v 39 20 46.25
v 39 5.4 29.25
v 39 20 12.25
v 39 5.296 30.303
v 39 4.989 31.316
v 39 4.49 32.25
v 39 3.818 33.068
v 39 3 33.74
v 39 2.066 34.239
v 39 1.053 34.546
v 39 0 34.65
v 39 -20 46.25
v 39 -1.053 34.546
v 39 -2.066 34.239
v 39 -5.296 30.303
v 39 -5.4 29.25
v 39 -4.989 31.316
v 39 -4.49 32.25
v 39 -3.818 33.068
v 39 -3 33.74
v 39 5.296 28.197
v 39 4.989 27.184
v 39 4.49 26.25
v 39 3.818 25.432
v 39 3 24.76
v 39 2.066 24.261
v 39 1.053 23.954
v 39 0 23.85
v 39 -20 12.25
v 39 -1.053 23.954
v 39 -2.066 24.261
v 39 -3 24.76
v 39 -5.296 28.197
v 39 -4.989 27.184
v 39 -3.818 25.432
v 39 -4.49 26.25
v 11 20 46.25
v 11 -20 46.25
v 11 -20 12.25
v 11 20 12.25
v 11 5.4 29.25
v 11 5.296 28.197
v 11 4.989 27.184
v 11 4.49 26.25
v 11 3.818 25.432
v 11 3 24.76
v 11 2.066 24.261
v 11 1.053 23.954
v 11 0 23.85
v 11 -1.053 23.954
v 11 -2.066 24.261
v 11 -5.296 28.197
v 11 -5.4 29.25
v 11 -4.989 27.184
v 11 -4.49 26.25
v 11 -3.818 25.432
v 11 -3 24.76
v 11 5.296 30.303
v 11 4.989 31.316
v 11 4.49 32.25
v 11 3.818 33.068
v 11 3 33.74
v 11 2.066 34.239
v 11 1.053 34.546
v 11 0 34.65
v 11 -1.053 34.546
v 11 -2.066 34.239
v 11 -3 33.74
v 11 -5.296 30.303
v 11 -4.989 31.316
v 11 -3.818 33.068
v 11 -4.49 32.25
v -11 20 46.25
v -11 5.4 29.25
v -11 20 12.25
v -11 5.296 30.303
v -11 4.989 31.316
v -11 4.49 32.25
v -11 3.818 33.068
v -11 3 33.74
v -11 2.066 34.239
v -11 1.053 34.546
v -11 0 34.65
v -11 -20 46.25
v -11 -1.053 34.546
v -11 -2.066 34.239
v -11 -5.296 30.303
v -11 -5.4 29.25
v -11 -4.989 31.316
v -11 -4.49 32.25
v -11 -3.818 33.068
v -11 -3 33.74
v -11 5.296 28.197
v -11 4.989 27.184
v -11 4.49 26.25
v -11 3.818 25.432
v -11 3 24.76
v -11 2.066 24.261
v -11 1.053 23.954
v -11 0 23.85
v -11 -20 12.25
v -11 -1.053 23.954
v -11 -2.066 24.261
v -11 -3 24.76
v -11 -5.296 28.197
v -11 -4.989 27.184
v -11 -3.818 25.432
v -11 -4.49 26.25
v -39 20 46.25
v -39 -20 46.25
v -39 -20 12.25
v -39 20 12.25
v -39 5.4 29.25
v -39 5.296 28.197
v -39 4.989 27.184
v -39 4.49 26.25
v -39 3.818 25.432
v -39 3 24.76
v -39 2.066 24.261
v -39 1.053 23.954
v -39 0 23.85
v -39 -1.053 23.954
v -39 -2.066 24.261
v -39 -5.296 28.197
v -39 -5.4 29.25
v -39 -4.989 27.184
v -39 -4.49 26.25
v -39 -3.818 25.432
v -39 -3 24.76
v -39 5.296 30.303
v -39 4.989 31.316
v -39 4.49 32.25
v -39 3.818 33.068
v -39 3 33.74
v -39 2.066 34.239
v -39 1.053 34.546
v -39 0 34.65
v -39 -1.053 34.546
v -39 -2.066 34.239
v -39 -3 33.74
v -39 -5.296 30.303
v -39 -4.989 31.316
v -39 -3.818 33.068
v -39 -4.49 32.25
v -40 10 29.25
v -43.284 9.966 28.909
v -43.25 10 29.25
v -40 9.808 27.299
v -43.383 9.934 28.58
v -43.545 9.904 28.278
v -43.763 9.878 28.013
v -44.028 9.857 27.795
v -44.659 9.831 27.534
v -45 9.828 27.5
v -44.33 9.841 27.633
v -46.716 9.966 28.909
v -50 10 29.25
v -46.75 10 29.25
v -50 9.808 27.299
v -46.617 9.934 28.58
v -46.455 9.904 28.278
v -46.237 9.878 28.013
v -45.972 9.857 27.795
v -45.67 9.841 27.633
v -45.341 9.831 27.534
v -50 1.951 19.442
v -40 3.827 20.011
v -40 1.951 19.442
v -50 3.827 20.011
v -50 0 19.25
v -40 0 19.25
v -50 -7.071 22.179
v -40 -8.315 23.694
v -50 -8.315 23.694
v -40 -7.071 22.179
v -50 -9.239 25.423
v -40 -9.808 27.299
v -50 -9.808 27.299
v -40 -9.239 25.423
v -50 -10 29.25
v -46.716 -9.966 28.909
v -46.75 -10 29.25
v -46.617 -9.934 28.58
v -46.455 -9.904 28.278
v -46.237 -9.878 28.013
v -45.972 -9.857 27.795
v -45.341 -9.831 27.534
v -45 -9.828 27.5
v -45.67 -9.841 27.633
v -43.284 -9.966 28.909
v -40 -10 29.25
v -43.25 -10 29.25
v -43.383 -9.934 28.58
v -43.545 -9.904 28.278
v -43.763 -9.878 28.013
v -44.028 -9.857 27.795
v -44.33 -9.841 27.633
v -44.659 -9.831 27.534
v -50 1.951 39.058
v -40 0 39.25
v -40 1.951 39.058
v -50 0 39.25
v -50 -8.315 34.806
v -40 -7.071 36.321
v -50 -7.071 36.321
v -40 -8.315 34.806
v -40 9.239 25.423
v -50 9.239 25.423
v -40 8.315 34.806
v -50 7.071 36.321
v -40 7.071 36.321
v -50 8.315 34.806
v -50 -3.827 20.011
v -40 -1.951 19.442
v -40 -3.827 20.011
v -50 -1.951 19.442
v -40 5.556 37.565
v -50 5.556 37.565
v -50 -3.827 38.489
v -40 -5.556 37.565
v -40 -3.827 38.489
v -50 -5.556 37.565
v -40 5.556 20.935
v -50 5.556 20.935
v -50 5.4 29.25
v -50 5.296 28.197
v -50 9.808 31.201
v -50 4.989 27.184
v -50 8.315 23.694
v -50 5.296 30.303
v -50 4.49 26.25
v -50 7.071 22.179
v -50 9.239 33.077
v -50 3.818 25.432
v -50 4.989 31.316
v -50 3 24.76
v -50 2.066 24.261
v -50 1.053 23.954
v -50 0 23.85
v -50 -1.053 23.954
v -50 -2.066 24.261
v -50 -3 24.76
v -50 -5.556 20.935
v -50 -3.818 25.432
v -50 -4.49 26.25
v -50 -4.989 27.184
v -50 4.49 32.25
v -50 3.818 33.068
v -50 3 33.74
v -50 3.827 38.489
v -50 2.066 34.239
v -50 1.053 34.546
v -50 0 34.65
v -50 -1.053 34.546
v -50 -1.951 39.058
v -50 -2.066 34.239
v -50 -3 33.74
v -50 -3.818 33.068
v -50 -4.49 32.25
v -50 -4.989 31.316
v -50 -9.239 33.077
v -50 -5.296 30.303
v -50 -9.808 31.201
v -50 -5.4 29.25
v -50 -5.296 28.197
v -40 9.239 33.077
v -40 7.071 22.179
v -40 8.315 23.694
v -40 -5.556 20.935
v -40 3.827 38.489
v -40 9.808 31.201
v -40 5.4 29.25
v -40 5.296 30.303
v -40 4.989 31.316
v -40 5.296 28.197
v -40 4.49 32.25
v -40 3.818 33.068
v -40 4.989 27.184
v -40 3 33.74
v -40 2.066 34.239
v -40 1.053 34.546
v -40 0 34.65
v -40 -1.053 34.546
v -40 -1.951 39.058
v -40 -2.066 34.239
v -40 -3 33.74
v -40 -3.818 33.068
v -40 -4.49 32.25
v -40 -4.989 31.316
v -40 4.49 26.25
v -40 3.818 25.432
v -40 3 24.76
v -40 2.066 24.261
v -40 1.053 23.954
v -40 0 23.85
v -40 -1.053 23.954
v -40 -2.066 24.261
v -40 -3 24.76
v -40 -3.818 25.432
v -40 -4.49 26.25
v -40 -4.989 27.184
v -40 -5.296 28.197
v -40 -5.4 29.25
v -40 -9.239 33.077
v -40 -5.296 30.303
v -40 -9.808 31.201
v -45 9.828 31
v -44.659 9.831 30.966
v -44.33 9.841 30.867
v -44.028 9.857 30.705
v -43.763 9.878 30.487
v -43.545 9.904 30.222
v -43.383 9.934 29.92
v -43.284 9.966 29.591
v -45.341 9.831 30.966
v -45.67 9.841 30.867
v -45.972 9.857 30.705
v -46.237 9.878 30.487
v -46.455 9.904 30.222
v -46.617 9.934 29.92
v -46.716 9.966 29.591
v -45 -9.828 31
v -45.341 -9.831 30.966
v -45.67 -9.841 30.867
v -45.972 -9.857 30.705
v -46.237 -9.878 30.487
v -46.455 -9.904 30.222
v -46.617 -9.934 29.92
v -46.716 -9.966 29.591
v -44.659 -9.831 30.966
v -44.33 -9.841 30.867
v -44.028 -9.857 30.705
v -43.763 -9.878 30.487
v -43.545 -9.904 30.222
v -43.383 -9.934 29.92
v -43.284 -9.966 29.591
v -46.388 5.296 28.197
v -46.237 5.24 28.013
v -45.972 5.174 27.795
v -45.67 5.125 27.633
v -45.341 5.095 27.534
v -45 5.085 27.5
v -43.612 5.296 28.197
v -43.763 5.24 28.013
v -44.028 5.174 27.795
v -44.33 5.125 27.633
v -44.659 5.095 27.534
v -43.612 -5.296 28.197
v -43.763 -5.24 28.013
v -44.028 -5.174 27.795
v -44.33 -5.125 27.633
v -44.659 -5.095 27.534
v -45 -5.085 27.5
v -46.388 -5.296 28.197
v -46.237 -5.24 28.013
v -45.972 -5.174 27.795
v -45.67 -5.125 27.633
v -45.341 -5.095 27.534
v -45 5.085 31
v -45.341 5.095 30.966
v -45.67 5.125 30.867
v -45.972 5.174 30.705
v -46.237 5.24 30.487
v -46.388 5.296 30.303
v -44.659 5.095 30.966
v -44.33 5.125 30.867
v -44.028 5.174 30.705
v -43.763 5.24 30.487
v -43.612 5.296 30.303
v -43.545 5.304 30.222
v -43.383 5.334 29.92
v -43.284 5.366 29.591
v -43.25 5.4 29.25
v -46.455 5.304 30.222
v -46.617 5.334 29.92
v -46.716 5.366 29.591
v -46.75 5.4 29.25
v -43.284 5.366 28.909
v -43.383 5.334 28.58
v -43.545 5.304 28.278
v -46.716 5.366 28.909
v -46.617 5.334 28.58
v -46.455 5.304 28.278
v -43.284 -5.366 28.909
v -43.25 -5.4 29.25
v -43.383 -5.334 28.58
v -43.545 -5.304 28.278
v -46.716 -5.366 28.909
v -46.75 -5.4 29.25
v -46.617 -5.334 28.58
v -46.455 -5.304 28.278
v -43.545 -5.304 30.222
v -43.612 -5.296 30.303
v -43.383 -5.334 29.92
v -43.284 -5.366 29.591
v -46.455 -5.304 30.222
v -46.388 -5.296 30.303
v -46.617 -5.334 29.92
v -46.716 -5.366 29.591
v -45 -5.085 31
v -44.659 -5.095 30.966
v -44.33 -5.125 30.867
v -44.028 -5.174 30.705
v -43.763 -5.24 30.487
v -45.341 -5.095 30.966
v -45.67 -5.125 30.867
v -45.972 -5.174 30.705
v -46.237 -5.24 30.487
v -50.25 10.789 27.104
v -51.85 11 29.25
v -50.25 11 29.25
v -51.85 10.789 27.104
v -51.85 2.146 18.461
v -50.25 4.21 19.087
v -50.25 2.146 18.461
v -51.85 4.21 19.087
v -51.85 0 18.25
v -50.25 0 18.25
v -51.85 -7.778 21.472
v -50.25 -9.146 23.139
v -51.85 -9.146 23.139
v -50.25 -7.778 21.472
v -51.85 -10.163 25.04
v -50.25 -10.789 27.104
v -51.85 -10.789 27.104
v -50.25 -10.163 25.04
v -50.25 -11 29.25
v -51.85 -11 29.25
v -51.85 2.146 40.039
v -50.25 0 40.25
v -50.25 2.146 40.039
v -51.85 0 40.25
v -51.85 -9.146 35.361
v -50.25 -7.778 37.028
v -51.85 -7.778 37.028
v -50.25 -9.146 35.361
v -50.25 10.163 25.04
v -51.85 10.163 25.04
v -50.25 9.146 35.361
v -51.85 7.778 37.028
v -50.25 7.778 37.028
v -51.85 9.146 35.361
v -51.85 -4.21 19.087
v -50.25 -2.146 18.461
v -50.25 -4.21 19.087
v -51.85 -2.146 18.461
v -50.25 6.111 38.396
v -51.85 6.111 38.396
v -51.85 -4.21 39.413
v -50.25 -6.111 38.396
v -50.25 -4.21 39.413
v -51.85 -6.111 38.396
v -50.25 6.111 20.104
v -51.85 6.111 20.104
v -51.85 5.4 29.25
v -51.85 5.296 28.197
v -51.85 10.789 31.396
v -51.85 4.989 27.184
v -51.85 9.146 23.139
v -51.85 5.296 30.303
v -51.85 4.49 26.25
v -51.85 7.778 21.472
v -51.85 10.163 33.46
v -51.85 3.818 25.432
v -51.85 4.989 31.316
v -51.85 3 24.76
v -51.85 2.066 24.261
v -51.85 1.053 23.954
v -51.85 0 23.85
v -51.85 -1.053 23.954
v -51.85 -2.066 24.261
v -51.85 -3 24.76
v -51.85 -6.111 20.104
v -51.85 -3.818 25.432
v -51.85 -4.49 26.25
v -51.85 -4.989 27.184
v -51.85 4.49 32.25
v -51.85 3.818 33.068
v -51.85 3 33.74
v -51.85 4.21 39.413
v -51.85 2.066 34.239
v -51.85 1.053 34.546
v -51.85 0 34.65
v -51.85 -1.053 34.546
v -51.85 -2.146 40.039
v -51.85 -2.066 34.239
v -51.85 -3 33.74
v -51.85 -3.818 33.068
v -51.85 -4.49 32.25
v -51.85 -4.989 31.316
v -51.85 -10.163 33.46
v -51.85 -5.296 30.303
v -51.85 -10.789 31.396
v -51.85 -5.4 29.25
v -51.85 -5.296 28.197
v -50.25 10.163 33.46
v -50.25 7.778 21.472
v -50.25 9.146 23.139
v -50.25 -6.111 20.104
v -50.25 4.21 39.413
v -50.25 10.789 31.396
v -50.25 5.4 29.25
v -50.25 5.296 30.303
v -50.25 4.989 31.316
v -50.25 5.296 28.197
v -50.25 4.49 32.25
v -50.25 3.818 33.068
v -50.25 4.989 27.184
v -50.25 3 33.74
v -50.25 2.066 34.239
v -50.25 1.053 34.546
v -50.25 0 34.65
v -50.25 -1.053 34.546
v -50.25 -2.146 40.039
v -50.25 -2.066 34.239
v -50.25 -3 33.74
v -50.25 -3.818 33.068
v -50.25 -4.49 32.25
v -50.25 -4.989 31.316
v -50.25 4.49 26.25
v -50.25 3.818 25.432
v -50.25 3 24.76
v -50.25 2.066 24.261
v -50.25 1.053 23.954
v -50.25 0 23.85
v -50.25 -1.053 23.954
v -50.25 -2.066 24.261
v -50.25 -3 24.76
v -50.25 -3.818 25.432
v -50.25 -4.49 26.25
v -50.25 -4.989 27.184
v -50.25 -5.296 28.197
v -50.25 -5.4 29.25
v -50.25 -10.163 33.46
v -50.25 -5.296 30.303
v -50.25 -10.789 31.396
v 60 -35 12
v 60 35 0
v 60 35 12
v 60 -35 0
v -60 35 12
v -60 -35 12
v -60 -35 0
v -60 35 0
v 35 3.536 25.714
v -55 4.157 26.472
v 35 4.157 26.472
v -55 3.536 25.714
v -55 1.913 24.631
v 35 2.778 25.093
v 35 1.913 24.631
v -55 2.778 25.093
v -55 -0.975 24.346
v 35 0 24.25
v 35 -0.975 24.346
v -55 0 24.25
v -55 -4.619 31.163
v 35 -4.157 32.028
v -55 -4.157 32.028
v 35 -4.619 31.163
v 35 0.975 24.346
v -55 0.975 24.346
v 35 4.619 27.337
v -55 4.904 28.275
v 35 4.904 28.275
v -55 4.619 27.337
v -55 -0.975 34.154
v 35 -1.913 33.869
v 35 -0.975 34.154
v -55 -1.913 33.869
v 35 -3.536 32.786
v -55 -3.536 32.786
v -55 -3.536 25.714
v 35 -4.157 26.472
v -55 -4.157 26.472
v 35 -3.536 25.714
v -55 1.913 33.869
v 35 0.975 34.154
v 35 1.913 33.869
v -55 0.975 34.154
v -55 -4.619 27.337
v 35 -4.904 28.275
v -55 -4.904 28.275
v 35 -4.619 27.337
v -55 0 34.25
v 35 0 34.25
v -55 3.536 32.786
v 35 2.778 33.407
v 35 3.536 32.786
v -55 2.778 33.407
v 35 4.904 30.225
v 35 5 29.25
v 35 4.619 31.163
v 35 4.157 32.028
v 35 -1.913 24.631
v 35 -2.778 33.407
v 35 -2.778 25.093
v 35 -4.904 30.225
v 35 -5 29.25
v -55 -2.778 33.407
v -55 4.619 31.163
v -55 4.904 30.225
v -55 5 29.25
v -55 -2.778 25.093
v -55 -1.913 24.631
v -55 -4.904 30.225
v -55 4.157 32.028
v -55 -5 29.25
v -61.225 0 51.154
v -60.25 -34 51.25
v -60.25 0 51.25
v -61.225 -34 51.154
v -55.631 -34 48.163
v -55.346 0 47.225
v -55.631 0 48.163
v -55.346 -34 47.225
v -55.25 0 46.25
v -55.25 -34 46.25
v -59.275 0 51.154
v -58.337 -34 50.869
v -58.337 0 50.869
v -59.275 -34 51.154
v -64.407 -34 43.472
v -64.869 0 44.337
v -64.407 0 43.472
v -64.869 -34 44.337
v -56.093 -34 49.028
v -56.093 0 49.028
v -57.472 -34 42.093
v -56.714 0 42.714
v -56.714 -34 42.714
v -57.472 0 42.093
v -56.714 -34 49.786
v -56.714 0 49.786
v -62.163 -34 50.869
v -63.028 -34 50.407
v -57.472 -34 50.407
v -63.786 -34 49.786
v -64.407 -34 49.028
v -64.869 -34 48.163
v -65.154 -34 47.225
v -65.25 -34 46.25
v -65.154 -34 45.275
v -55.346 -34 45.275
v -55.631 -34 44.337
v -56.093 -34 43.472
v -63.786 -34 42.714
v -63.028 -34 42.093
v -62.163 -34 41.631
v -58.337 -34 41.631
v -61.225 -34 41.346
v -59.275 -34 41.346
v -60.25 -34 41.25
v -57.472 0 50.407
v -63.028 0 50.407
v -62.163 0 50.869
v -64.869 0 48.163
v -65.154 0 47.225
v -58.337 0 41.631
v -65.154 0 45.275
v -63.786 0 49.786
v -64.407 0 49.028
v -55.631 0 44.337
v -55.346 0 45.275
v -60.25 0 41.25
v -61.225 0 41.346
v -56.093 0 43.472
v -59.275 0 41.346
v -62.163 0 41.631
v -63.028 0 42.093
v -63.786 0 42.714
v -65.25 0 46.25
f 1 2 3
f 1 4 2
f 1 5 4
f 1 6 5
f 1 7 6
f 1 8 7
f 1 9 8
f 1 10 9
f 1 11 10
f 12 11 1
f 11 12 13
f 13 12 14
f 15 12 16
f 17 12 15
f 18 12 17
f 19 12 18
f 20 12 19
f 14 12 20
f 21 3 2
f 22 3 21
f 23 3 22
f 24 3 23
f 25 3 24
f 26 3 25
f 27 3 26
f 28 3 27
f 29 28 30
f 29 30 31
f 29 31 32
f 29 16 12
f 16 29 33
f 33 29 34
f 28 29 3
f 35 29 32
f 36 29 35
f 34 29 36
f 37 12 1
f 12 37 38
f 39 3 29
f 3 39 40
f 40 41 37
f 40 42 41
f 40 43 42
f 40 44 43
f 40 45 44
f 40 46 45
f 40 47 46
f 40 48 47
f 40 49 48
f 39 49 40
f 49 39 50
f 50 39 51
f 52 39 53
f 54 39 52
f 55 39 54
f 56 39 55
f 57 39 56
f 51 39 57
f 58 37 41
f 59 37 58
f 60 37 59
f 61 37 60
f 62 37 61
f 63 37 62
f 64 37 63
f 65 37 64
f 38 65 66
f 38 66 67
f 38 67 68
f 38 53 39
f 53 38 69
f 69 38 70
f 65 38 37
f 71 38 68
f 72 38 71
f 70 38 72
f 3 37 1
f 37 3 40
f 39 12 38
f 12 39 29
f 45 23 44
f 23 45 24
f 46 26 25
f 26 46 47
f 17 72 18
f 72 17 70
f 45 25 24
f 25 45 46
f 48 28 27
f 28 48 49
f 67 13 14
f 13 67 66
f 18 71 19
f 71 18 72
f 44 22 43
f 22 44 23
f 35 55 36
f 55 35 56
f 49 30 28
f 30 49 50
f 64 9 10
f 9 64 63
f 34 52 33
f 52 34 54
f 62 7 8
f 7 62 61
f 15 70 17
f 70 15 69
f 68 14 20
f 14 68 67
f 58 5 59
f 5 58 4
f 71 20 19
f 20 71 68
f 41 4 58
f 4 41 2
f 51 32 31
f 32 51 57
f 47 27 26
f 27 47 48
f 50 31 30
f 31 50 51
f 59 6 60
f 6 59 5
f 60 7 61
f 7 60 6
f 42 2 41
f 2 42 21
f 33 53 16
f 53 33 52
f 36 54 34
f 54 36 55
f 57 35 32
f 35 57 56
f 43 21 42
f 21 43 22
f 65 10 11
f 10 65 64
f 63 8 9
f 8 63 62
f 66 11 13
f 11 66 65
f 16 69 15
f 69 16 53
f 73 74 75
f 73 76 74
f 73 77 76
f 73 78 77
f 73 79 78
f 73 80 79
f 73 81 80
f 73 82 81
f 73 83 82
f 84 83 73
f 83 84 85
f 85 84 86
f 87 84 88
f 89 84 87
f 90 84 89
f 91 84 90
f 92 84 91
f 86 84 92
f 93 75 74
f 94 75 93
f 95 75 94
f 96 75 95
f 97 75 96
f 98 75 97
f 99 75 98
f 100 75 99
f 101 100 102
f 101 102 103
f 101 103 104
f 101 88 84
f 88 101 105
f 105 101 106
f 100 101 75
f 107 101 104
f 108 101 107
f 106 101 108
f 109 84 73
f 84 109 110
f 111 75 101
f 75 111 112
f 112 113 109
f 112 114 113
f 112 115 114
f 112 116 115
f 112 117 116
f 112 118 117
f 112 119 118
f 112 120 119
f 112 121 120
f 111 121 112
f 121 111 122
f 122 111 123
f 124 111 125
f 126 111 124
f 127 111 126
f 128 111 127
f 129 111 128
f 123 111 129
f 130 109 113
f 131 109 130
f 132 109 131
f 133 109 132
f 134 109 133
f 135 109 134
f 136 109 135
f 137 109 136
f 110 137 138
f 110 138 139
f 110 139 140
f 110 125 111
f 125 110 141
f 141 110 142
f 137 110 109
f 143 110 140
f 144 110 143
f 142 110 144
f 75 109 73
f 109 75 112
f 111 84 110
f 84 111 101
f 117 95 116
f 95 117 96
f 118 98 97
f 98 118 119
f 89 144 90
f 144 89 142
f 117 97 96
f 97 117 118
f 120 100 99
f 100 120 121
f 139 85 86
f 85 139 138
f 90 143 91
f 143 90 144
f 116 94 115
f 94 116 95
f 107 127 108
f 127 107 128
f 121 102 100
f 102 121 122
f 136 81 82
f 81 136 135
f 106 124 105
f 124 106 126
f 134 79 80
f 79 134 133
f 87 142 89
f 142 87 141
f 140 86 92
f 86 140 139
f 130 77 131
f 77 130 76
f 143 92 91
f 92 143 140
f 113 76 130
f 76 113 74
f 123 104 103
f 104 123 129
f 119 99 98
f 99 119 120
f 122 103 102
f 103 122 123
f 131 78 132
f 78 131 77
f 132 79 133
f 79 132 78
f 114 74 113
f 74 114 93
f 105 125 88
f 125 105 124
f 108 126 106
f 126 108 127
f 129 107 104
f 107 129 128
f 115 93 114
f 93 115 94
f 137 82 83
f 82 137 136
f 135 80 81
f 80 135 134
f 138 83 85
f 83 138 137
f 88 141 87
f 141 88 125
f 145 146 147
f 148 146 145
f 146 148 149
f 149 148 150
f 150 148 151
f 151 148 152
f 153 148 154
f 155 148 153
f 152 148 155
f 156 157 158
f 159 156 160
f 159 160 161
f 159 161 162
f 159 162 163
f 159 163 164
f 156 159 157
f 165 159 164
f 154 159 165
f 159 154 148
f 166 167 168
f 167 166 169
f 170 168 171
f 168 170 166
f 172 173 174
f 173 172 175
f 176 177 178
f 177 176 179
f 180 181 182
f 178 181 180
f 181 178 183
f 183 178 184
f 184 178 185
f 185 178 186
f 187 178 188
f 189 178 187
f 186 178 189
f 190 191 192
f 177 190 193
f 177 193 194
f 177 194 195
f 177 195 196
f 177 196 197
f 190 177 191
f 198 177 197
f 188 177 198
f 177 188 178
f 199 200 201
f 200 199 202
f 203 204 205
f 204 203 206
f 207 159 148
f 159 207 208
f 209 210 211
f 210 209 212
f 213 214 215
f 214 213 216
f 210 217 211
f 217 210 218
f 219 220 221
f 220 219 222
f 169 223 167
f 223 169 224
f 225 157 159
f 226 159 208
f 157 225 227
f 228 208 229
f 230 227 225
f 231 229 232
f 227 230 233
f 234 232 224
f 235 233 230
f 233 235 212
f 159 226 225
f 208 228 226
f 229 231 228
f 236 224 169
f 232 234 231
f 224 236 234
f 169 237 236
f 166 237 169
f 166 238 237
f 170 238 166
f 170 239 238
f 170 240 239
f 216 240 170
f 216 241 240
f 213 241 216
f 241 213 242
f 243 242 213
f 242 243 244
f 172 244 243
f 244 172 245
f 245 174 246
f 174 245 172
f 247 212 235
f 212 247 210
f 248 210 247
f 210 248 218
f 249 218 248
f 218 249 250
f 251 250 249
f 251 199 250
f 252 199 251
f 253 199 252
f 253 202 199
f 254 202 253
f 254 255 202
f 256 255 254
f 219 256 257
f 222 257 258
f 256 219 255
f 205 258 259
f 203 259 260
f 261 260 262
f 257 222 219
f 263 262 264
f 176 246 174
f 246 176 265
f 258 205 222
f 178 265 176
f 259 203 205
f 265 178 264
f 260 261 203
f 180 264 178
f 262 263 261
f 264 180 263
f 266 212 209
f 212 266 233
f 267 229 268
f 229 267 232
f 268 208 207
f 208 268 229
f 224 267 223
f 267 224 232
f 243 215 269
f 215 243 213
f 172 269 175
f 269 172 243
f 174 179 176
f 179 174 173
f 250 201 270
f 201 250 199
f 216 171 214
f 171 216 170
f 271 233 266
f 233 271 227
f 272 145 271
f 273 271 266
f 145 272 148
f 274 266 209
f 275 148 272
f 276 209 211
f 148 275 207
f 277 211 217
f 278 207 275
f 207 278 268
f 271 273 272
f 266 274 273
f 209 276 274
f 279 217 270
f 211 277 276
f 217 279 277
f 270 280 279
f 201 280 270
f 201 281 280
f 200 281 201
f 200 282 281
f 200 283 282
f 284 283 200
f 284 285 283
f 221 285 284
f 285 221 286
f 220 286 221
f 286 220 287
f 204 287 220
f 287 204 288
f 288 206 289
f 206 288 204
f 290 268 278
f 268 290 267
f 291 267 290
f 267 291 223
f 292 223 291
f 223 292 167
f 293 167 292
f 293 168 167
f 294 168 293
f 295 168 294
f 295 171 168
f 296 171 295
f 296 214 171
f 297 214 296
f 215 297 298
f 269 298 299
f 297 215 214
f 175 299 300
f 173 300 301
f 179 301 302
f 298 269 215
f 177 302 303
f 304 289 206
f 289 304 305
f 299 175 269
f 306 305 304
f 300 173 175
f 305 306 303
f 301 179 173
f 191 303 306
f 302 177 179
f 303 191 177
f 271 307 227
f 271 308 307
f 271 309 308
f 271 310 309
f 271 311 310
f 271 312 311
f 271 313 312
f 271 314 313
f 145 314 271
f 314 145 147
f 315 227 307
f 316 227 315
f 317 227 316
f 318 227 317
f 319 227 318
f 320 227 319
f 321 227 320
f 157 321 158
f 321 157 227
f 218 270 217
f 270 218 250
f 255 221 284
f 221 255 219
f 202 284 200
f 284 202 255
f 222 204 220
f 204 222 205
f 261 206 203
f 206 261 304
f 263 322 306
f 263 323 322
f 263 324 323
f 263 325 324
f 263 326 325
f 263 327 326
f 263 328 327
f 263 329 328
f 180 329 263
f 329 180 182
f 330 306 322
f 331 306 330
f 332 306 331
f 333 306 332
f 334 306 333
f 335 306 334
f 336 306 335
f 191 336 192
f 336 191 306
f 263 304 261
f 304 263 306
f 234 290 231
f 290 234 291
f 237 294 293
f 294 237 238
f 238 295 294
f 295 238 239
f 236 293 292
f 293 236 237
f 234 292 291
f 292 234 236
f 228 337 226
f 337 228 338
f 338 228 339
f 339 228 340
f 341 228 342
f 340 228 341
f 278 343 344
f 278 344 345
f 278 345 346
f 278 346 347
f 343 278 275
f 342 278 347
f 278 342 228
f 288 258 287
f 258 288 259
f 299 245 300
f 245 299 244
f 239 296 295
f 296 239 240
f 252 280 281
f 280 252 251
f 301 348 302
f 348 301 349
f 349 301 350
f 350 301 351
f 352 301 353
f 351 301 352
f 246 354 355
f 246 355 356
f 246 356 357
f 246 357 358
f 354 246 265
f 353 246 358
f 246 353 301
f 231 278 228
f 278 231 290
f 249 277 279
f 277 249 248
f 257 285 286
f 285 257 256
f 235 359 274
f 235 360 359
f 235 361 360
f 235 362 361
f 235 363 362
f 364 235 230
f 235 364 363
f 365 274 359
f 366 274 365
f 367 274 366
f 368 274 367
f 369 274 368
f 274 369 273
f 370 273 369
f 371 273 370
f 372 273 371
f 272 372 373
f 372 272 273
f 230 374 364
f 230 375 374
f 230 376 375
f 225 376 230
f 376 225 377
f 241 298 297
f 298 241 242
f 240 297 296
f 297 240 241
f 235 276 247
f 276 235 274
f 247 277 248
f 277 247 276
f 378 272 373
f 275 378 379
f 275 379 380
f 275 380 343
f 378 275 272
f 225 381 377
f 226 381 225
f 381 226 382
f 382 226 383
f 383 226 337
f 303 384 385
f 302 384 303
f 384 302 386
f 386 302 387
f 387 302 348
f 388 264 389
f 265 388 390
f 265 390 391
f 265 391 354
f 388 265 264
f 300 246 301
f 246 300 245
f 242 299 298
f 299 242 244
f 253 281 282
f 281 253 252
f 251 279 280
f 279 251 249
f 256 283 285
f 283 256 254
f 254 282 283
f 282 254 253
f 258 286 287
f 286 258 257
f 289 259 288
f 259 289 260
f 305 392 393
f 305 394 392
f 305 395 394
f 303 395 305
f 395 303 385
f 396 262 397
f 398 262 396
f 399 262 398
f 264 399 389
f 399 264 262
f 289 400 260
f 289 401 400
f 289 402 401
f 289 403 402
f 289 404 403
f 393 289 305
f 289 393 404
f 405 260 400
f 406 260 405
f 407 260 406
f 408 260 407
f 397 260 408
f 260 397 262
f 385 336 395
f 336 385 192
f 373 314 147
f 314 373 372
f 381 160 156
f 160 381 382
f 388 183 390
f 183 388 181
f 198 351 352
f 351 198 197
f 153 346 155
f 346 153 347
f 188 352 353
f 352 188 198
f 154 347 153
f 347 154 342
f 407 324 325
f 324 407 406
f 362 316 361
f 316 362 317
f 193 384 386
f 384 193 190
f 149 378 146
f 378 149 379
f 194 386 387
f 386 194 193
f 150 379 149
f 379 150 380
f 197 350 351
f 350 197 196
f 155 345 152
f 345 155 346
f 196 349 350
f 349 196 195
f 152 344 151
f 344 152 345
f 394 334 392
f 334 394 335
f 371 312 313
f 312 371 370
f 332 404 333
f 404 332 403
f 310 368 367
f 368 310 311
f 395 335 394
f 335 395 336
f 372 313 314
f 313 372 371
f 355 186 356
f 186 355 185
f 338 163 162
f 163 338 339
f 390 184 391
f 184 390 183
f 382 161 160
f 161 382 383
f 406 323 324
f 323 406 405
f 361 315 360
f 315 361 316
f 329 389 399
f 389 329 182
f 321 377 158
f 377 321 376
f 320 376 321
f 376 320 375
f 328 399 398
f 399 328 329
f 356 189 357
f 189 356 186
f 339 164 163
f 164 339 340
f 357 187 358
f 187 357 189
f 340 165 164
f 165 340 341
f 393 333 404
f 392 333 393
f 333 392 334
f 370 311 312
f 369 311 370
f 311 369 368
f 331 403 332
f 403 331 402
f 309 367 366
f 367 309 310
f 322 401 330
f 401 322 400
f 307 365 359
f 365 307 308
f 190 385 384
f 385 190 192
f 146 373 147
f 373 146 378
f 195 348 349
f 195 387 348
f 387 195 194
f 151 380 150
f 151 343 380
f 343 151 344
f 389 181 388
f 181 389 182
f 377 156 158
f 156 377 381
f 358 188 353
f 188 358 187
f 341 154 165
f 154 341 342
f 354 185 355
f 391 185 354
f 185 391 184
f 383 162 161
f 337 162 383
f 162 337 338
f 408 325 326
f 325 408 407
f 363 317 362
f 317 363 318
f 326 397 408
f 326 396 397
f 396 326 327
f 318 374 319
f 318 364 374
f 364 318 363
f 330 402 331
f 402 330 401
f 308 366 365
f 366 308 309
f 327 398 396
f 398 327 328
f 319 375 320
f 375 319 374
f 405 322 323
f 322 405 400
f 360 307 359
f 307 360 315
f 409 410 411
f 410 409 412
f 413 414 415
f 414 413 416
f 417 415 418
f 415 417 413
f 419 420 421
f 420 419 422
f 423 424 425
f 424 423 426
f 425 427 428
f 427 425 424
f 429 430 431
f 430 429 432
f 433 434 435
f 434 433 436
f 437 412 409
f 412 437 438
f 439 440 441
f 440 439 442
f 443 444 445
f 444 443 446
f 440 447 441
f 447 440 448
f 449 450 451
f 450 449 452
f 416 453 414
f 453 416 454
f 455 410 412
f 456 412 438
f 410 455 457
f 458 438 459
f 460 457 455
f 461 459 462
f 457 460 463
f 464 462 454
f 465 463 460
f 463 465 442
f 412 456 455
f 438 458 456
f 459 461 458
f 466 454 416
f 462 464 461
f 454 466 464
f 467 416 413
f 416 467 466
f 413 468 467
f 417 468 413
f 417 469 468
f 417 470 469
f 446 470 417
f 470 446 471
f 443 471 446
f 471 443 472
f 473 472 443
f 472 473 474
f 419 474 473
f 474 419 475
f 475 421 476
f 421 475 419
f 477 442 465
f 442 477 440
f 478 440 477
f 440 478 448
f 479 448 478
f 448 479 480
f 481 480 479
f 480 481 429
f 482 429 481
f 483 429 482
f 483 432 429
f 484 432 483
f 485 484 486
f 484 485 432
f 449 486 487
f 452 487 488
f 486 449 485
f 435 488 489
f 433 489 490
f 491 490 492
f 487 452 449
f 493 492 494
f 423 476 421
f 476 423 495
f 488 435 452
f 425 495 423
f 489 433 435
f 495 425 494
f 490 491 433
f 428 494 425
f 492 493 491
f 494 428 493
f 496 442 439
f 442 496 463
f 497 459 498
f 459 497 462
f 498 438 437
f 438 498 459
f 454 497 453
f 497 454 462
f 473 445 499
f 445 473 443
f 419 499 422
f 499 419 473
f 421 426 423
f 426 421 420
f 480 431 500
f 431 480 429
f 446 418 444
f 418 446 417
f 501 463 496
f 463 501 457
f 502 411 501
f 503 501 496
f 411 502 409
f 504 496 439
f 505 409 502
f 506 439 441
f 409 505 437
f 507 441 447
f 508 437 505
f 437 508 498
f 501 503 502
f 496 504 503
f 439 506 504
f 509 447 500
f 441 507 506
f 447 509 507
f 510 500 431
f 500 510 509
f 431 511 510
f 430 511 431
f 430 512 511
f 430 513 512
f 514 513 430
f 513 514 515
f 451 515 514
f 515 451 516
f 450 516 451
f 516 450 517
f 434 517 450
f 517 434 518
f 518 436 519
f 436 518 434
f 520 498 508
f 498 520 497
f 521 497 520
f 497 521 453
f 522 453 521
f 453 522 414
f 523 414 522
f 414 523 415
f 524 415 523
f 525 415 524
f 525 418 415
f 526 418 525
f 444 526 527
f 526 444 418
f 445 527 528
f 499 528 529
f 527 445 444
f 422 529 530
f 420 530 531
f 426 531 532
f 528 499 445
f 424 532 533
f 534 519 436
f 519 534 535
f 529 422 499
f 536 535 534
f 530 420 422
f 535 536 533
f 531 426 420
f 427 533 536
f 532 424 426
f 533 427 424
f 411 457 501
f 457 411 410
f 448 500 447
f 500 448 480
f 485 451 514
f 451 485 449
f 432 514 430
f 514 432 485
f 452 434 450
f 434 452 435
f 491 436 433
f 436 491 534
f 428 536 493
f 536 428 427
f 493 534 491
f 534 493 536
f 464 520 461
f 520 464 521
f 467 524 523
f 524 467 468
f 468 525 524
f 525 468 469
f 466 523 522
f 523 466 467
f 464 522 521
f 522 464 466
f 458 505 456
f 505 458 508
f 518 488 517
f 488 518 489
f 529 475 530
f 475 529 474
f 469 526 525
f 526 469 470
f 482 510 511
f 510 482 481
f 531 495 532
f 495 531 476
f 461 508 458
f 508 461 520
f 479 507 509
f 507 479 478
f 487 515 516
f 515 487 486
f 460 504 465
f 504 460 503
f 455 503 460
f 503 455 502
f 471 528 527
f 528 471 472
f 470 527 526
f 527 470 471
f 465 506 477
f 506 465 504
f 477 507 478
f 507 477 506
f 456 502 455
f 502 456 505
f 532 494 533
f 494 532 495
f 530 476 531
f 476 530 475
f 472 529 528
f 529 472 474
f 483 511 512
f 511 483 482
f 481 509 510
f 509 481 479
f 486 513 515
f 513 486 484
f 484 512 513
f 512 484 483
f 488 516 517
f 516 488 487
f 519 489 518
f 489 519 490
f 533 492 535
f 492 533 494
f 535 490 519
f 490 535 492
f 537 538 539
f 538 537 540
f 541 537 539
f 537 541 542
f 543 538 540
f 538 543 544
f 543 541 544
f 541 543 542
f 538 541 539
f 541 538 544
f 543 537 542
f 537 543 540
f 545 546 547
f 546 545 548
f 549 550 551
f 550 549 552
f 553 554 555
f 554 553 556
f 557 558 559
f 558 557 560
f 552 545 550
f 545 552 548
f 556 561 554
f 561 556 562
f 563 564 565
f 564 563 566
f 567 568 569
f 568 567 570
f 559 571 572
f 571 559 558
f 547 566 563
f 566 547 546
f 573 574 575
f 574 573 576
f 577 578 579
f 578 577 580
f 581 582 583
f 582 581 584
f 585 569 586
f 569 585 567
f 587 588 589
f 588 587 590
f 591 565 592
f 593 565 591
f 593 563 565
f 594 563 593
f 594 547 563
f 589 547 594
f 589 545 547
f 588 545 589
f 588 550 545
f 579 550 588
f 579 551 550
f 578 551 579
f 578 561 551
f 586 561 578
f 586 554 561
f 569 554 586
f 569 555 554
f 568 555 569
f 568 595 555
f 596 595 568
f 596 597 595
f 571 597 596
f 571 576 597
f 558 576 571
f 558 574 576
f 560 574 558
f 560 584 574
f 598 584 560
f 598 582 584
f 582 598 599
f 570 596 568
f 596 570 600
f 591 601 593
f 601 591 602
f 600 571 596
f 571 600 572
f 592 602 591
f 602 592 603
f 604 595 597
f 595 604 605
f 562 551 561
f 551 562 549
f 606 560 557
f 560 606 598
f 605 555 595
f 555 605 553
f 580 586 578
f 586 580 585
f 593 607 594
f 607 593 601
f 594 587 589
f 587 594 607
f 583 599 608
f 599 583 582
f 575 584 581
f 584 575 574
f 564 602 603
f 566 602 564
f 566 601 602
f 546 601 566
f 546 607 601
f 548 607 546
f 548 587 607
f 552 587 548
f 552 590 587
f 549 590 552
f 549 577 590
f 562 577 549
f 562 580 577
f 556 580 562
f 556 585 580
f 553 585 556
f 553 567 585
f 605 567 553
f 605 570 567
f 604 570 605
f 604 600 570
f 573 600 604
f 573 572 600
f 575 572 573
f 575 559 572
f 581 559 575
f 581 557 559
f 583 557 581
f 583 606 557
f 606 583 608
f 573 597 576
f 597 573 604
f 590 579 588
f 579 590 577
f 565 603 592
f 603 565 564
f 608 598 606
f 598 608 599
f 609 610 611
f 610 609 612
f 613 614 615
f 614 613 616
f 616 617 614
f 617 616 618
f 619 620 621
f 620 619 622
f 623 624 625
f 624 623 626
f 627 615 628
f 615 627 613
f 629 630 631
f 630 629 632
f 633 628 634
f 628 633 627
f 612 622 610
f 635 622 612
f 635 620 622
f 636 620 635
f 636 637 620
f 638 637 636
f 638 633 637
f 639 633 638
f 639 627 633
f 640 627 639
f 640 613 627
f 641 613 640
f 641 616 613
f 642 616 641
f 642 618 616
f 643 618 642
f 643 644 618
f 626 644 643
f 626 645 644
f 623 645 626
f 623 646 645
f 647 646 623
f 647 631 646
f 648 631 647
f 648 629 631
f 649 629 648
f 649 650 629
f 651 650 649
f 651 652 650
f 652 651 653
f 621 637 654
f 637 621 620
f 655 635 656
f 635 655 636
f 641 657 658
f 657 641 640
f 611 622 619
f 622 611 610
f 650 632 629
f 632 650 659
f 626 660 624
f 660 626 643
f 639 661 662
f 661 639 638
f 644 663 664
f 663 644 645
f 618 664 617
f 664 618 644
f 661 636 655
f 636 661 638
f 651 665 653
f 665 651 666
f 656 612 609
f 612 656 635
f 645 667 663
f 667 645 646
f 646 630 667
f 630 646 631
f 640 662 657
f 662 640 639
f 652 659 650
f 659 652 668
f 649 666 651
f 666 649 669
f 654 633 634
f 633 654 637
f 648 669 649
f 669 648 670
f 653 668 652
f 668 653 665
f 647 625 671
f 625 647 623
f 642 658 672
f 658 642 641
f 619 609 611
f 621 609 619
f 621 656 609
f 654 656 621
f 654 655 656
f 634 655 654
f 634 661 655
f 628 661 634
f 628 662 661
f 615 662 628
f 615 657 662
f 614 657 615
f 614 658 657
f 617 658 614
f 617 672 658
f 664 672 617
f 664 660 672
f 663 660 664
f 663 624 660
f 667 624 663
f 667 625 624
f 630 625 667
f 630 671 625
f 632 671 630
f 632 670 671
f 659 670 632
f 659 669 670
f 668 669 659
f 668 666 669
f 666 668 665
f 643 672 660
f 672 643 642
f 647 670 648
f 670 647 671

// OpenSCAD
$fn = 32;

// ------------------------------------------------------------------------
// Machine vise: screw d10, jaws 28 x 34 mm
// Every part is its own module, assembly() places every instance.
// ------------------------------------------------------------------------

// --- part 1 ---
module vise_bed() {
  difference() {
    translate([-60, -35, 0]) cube([120, 70, 12]);
  }
}

// --- part 2 ---
module vise_jaw() {
  difference() {
    translate([-14, -20, 0]) cube([28, 40, 34]);
    translate([0, 0, 17]) rotate([0, 90, 0]) cylinder(h = 30, d = 10.8, center = true);
  }
}

// --- part 3 ---
module vise_screw() {
  translate([0, 0, -45]) cylinder(h = 90, d = 10);
}

// --- part 4 ---
module screw_collar() {
  difference() {
    cylinder(h = 10, d = 20);
    translate([0, 0, -1]) cylinder(h = 12, d = 10.8);
    translate([0, 0, 5]) rotate([90, 0, 0]) cylinder(h = 22, d = 3.5, center = true);
  }
}

// --- part 5 ---
module screw_washer() {
  difference() {
      translate([0, 0, 0]) cylinder(h = 1.6, d = 22);
      translate([0, 0, -1]) cylinder(h = 3.6, d = 10.8);
    }
}

// --- part 6 ---
module vise_handle() {
  cylinder(h = 34, d = 10);
}

// --- assembly ---
module assembly() {
  color([0.80, 0.24, 0.20]) translate([0, 0, 0]) rotate([0, 0, 0]) vise_bed();
  color([0.20, 0.45, 0.75]) translate([25, 0, 12.25]) rotate([0, 0, 0]) vise_jaw();
  color([0.25, 0.62, 0.32]) translate([-25, 0, 12.25]) rotate([0, 0, 0]) vise_jaw();
  color([0.92, 0.70, 0.18]) translate([-10, 0, 29.25]) rotate([0, 90, 0]) vise_screw();
  color([0.58, 0.35, 0.70]) translate([-50, 0, 29.25]) rotate([0, 90, 0]) screw_collar();
  color([0.16, 0.66, 0.66]) translate([-51.85, 0, 29.25]) rotate([0, 90, 0]) screw_washer();
  color([0.85, 0.48, 0.18]) translate([-60.25, 0, 46.25]) rotate([90, 0, 0]) vise_handle();
}

assembly();
